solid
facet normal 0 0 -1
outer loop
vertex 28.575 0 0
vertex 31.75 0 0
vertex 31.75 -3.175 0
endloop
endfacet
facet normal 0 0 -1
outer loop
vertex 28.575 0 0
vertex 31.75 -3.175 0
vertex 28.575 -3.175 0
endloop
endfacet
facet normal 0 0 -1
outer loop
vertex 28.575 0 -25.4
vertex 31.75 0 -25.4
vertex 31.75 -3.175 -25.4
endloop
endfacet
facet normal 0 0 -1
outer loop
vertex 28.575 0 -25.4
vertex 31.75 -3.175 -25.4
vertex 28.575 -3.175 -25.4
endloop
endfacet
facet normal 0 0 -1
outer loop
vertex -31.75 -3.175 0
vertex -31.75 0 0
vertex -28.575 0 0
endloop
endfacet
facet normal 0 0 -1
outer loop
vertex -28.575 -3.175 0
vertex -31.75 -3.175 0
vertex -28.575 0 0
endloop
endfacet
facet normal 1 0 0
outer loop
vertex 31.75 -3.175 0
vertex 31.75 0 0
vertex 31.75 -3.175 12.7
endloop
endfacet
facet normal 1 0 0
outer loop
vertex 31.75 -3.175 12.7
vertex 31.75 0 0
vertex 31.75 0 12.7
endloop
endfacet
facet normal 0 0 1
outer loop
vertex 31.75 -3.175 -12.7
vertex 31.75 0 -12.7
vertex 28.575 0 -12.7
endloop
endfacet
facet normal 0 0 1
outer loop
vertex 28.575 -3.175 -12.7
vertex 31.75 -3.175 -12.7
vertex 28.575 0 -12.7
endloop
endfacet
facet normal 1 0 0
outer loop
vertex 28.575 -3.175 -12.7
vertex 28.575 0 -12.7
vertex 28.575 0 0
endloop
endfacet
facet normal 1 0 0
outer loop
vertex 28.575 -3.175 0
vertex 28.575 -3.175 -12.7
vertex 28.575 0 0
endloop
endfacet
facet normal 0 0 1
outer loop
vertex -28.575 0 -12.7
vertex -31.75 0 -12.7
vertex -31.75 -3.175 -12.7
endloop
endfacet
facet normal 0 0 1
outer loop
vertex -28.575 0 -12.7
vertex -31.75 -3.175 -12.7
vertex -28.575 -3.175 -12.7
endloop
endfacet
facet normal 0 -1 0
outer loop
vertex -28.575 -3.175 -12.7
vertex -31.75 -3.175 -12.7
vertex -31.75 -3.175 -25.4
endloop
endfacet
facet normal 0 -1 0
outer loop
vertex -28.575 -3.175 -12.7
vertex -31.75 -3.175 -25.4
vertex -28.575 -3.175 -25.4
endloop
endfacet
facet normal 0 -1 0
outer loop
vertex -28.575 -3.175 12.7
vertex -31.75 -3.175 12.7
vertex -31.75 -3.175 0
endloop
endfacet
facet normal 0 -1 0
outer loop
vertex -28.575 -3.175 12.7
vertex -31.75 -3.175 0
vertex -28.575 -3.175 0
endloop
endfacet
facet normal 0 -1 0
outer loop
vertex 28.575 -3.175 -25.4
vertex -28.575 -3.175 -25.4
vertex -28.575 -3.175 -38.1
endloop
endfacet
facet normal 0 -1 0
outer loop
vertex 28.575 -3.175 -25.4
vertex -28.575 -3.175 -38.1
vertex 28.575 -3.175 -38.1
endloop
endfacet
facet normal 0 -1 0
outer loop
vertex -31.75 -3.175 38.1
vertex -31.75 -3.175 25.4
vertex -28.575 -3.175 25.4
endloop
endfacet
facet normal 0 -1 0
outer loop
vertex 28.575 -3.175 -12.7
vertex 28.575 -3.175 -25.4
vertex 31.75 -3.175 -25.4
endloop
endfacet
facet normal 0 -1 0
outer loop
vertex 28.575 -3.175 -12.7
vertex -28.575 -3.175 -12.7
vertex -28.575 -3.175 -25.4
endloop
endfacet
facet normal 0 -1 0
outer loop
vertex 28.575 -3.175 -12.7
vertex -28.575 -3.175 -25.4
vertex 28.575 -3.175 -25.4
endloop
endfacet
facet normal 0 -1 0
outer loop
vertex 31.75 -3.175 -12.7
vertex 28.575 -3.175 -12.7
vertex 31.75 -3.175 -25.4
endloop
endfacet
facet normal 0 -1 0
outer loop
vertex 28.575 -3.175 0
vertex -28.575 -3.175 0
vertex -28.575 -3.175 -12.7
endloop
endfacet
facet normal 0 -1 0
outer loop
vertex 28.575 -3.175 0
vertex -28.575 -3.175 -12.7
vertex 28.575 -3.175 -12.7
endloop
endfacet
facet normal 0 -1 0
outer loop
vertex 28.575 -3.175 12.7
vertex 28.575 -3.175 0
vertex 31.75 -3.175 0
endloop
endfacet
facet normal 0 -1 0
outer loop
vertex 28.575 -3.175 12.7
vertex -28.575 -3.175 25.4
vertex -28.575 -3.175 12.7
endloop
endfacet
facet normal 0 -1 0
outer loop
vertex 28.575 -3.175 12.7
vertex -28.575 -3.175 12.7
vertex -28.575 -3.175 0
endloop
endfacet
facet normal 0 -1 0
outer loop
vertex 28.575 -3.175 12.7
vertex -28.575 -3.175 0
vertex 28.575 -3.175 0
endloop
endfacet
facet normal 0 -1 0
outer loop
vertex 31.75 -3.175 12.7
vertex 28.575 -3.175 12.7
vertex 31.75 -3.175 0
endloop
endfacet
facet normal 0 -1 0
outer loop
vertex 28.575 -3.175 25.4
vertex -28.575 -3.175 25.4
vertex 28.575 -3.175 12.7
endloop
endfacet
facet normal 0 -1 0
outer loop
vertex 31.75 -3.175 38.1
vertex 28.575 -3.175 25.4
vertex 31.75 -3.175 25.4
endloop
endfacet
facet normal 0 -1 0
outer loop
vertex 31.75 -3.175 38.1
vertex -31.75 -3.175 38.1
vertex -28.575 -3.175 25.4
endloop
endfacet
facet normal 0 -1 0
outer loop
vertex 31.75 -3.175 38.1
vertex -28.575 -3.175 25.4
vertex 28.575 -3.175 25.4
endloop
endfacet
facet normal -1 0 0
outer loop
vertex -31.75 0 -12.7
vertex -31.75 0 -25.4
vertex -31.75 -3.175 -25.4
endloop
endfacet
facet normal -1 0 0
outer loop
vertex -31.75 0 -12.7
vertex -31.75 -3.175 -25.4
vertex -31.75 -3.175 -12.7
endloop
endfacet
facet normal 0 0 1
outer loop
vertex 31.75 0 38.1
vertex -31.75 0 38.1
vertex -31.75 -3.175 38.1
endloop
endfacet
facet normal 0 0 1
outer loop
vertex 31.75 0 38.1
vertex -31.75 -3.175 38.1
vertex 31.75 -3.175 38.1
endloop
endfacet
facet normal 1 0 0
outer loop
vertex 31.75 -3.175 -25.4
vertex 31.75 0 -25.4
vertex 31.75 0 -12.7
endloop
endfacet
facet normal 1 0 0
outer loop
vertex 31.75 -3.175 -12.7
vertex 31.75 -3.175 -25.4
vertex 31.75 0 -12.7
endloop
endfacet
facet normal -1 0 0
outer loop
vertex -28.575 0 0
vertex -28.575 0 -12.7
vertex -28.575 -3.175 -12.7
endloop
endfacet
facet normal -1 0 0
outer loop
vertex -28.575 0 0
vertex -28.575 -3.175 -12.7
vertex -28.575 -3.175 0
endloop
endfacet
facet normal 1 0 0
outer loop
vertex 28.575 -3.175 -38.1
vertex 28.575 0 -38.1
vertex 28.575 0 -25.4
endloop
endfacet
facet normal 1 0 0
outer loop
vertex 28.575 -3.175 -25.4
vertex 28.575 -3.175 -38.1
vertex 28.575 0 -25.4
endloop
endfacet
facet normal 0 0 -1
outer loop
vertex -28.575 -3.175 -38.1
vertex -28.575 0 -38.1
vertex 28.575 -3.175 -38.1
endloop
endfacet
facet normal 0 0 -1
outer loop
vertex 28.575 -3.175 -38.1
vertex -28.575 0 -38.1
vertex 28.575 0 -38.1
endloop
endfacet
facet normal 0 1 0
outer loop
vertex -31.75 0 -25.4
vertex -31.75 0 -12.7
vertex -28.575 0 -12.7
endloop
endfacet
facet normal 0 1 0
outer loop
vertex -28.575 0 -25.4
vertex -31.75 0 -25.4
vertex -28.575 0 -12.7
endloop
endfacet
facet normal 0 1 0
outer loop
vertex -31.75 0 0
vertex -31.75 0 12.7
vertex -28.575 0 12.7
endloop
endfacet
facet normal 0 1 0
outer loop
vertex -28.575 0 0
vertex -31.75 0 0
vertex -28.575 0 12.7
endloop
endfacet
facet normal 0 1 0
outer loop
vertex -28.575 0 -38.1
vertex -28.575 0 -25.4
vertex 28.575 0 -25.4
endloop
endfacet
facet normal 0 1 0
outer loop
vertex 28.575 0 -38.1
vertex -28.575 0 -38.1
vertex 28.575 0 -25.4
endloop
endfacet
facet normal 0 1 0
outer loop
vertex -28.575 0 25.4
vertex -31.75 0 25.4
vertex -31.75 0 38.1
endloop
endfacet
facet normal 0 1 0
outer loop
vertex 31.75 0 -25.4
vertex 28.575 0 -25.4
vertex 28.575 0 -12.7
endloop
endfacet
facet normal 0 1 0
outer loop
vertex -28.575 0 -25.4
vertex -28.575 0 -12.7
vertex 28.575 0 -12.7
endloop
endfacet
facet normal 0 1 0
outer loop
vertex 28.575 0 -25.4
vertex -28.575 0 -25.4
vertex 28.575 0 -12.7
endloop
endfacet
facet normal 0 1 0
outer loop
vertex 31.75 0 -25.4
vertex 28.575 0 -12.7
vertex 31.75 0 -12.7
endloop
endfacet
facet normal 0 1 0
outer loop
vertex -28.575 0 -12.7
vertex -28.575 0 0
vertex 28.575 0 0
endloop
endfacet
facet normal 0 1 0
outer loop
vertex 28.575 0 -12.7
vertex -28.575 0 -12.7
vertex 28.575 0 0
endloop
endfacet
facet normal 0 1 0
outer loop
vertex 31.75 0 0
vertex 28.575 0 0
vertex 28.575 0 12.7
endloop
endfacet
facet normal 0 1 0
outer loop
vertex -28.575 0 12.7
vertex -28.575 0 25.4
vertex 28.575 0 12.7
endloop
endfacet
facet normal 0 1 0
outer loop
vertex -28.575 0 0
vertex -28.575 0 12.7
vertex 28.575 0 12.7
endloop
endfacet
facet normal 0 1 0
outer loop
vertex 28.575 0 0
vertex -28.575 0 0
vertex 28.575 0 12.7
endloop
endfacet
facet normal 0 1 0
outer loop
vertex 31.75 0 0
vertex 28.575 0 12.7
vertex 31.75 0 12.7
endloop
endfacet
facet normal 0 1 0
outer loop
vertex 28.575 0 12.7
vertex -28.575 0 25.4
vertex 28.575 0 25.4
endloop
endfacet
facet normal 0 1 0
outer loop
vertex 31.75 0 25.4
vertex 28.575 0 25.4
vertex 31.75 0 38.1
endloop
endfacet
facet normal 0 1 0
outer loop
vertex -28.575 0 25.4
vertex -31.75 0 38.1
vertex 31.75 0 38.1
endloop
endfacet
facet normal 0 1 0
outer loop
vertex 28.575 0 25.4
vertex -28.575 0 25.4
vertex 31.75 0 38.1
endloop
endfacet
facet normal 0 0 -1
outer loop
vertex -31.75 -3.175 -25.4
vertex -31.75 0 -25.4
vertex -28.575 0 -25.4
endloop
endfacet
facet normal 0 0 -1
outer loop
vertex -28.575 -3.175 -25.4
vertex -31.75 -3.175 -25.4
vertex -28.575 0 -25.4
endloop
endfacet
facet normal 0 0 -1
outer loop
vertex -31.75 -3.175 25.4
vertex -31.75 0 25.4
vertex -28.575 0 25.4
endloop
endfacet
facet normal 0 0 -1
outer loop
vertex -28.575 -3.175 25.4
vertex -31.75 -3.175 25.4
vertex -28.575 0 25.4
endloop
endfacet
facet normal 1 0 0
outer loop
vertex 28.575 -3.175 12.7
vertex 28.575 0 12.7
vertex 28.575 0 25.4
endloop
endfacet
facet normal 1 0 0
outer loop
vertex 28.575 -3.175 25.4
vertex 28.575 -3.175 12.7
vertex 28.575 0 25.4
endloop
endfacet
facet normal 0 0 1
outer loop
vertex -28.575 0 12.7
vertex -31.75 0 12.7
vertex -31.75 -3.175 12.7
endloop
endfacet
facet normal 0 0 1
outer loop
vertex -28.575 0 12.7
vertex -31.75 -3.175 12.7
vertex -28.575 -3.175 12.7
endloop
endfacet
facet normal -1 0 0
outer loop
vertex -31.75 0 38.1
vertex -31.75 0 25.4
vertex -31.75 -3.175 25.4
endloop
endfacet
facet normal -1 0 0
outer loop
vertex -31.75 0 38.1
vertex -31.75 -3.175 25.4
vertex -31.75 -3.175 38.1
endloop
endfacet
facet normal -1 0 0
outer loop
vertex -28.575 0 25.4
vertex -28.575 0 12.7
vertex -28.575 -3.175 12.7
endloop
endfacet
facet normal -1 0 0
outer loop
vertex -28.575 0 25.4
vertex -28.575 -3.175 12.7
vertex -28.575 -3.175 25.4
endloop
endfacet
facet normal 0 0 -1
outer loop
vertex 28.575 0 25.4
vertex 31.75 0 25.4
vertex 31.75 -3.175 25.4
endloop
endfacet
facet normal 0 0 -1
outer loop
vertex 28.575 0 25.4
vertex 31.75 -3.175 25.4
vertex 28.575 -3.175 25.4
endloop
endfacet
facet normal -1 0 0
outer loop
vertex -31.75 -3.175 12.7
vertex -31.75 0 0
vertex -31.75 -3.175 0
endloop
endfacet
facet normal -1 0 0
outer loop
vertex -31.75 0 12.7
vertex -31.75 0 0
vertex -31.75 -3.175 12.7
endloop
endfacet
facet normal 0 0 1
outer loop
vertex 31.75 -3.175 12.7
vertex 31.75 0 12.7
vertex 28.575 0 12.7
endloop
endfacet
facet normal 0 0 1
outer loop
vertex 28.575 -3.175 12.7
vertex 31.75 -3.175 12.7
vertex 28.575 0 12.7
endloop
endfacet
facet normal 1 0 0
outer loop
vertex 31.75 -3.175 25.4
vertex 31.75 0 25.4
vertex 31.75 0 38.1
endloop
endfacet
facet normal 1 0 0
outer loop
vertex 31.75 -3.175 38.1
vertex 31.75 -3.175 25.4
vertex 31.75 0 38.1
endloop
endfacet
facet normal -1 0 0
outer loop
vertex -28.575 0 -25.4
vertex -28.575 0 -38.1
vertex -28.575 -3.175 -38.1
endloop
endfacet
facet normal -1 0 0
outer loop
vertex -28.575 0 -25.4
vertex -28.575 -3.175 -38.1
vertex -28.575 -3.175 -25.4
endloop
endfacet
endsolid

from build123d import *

# Parameters (mm, degrees)
F0_W     = 63.5
F0_H     = 76.2
F1_DEPTH = 3.175
F2_W     = 3.175
F2_H     = 12.7
F3_DEPTH = 3.176


# Not quite as in the source:
# - a pattern or mirror of a feature is missing from the dataset's text; its kind, count and spacing are read off the source's solid


with BuildPart() as f1:
    # F0 (on Front) → F1 (new body)
    with BuildSketch(Plane.XZ):
        Rectangle(F0_W, F0_H)
    extrude(amount=F1_DEPTH)

    # F2 (on Front) → F3 (cut, through all)
    with BuildSketch(Plane.XZ):
        with Locations((-30.1625, 19.05)):
            Rectangle(F2_W, F2_H)
        with Locations((-30.1625, -6.35)):
            Rectangle(F2_W, F2_H)
        with Locations((-30.1625, -31.75)):
            Rectangle(F2_W, F2_H)
    f3 = extrude(amount=F3_DEPTH, mode=Mode.SUBTRACT)

    # F3_copies: F3 across plane
    add(f3.mirror(Plane(origin=(0, 0, 0), x_dir=(0, 0, 1), z_dir=(1, 0, 0))), mode=Mode.SUBTRACT)


solid = f1.part
